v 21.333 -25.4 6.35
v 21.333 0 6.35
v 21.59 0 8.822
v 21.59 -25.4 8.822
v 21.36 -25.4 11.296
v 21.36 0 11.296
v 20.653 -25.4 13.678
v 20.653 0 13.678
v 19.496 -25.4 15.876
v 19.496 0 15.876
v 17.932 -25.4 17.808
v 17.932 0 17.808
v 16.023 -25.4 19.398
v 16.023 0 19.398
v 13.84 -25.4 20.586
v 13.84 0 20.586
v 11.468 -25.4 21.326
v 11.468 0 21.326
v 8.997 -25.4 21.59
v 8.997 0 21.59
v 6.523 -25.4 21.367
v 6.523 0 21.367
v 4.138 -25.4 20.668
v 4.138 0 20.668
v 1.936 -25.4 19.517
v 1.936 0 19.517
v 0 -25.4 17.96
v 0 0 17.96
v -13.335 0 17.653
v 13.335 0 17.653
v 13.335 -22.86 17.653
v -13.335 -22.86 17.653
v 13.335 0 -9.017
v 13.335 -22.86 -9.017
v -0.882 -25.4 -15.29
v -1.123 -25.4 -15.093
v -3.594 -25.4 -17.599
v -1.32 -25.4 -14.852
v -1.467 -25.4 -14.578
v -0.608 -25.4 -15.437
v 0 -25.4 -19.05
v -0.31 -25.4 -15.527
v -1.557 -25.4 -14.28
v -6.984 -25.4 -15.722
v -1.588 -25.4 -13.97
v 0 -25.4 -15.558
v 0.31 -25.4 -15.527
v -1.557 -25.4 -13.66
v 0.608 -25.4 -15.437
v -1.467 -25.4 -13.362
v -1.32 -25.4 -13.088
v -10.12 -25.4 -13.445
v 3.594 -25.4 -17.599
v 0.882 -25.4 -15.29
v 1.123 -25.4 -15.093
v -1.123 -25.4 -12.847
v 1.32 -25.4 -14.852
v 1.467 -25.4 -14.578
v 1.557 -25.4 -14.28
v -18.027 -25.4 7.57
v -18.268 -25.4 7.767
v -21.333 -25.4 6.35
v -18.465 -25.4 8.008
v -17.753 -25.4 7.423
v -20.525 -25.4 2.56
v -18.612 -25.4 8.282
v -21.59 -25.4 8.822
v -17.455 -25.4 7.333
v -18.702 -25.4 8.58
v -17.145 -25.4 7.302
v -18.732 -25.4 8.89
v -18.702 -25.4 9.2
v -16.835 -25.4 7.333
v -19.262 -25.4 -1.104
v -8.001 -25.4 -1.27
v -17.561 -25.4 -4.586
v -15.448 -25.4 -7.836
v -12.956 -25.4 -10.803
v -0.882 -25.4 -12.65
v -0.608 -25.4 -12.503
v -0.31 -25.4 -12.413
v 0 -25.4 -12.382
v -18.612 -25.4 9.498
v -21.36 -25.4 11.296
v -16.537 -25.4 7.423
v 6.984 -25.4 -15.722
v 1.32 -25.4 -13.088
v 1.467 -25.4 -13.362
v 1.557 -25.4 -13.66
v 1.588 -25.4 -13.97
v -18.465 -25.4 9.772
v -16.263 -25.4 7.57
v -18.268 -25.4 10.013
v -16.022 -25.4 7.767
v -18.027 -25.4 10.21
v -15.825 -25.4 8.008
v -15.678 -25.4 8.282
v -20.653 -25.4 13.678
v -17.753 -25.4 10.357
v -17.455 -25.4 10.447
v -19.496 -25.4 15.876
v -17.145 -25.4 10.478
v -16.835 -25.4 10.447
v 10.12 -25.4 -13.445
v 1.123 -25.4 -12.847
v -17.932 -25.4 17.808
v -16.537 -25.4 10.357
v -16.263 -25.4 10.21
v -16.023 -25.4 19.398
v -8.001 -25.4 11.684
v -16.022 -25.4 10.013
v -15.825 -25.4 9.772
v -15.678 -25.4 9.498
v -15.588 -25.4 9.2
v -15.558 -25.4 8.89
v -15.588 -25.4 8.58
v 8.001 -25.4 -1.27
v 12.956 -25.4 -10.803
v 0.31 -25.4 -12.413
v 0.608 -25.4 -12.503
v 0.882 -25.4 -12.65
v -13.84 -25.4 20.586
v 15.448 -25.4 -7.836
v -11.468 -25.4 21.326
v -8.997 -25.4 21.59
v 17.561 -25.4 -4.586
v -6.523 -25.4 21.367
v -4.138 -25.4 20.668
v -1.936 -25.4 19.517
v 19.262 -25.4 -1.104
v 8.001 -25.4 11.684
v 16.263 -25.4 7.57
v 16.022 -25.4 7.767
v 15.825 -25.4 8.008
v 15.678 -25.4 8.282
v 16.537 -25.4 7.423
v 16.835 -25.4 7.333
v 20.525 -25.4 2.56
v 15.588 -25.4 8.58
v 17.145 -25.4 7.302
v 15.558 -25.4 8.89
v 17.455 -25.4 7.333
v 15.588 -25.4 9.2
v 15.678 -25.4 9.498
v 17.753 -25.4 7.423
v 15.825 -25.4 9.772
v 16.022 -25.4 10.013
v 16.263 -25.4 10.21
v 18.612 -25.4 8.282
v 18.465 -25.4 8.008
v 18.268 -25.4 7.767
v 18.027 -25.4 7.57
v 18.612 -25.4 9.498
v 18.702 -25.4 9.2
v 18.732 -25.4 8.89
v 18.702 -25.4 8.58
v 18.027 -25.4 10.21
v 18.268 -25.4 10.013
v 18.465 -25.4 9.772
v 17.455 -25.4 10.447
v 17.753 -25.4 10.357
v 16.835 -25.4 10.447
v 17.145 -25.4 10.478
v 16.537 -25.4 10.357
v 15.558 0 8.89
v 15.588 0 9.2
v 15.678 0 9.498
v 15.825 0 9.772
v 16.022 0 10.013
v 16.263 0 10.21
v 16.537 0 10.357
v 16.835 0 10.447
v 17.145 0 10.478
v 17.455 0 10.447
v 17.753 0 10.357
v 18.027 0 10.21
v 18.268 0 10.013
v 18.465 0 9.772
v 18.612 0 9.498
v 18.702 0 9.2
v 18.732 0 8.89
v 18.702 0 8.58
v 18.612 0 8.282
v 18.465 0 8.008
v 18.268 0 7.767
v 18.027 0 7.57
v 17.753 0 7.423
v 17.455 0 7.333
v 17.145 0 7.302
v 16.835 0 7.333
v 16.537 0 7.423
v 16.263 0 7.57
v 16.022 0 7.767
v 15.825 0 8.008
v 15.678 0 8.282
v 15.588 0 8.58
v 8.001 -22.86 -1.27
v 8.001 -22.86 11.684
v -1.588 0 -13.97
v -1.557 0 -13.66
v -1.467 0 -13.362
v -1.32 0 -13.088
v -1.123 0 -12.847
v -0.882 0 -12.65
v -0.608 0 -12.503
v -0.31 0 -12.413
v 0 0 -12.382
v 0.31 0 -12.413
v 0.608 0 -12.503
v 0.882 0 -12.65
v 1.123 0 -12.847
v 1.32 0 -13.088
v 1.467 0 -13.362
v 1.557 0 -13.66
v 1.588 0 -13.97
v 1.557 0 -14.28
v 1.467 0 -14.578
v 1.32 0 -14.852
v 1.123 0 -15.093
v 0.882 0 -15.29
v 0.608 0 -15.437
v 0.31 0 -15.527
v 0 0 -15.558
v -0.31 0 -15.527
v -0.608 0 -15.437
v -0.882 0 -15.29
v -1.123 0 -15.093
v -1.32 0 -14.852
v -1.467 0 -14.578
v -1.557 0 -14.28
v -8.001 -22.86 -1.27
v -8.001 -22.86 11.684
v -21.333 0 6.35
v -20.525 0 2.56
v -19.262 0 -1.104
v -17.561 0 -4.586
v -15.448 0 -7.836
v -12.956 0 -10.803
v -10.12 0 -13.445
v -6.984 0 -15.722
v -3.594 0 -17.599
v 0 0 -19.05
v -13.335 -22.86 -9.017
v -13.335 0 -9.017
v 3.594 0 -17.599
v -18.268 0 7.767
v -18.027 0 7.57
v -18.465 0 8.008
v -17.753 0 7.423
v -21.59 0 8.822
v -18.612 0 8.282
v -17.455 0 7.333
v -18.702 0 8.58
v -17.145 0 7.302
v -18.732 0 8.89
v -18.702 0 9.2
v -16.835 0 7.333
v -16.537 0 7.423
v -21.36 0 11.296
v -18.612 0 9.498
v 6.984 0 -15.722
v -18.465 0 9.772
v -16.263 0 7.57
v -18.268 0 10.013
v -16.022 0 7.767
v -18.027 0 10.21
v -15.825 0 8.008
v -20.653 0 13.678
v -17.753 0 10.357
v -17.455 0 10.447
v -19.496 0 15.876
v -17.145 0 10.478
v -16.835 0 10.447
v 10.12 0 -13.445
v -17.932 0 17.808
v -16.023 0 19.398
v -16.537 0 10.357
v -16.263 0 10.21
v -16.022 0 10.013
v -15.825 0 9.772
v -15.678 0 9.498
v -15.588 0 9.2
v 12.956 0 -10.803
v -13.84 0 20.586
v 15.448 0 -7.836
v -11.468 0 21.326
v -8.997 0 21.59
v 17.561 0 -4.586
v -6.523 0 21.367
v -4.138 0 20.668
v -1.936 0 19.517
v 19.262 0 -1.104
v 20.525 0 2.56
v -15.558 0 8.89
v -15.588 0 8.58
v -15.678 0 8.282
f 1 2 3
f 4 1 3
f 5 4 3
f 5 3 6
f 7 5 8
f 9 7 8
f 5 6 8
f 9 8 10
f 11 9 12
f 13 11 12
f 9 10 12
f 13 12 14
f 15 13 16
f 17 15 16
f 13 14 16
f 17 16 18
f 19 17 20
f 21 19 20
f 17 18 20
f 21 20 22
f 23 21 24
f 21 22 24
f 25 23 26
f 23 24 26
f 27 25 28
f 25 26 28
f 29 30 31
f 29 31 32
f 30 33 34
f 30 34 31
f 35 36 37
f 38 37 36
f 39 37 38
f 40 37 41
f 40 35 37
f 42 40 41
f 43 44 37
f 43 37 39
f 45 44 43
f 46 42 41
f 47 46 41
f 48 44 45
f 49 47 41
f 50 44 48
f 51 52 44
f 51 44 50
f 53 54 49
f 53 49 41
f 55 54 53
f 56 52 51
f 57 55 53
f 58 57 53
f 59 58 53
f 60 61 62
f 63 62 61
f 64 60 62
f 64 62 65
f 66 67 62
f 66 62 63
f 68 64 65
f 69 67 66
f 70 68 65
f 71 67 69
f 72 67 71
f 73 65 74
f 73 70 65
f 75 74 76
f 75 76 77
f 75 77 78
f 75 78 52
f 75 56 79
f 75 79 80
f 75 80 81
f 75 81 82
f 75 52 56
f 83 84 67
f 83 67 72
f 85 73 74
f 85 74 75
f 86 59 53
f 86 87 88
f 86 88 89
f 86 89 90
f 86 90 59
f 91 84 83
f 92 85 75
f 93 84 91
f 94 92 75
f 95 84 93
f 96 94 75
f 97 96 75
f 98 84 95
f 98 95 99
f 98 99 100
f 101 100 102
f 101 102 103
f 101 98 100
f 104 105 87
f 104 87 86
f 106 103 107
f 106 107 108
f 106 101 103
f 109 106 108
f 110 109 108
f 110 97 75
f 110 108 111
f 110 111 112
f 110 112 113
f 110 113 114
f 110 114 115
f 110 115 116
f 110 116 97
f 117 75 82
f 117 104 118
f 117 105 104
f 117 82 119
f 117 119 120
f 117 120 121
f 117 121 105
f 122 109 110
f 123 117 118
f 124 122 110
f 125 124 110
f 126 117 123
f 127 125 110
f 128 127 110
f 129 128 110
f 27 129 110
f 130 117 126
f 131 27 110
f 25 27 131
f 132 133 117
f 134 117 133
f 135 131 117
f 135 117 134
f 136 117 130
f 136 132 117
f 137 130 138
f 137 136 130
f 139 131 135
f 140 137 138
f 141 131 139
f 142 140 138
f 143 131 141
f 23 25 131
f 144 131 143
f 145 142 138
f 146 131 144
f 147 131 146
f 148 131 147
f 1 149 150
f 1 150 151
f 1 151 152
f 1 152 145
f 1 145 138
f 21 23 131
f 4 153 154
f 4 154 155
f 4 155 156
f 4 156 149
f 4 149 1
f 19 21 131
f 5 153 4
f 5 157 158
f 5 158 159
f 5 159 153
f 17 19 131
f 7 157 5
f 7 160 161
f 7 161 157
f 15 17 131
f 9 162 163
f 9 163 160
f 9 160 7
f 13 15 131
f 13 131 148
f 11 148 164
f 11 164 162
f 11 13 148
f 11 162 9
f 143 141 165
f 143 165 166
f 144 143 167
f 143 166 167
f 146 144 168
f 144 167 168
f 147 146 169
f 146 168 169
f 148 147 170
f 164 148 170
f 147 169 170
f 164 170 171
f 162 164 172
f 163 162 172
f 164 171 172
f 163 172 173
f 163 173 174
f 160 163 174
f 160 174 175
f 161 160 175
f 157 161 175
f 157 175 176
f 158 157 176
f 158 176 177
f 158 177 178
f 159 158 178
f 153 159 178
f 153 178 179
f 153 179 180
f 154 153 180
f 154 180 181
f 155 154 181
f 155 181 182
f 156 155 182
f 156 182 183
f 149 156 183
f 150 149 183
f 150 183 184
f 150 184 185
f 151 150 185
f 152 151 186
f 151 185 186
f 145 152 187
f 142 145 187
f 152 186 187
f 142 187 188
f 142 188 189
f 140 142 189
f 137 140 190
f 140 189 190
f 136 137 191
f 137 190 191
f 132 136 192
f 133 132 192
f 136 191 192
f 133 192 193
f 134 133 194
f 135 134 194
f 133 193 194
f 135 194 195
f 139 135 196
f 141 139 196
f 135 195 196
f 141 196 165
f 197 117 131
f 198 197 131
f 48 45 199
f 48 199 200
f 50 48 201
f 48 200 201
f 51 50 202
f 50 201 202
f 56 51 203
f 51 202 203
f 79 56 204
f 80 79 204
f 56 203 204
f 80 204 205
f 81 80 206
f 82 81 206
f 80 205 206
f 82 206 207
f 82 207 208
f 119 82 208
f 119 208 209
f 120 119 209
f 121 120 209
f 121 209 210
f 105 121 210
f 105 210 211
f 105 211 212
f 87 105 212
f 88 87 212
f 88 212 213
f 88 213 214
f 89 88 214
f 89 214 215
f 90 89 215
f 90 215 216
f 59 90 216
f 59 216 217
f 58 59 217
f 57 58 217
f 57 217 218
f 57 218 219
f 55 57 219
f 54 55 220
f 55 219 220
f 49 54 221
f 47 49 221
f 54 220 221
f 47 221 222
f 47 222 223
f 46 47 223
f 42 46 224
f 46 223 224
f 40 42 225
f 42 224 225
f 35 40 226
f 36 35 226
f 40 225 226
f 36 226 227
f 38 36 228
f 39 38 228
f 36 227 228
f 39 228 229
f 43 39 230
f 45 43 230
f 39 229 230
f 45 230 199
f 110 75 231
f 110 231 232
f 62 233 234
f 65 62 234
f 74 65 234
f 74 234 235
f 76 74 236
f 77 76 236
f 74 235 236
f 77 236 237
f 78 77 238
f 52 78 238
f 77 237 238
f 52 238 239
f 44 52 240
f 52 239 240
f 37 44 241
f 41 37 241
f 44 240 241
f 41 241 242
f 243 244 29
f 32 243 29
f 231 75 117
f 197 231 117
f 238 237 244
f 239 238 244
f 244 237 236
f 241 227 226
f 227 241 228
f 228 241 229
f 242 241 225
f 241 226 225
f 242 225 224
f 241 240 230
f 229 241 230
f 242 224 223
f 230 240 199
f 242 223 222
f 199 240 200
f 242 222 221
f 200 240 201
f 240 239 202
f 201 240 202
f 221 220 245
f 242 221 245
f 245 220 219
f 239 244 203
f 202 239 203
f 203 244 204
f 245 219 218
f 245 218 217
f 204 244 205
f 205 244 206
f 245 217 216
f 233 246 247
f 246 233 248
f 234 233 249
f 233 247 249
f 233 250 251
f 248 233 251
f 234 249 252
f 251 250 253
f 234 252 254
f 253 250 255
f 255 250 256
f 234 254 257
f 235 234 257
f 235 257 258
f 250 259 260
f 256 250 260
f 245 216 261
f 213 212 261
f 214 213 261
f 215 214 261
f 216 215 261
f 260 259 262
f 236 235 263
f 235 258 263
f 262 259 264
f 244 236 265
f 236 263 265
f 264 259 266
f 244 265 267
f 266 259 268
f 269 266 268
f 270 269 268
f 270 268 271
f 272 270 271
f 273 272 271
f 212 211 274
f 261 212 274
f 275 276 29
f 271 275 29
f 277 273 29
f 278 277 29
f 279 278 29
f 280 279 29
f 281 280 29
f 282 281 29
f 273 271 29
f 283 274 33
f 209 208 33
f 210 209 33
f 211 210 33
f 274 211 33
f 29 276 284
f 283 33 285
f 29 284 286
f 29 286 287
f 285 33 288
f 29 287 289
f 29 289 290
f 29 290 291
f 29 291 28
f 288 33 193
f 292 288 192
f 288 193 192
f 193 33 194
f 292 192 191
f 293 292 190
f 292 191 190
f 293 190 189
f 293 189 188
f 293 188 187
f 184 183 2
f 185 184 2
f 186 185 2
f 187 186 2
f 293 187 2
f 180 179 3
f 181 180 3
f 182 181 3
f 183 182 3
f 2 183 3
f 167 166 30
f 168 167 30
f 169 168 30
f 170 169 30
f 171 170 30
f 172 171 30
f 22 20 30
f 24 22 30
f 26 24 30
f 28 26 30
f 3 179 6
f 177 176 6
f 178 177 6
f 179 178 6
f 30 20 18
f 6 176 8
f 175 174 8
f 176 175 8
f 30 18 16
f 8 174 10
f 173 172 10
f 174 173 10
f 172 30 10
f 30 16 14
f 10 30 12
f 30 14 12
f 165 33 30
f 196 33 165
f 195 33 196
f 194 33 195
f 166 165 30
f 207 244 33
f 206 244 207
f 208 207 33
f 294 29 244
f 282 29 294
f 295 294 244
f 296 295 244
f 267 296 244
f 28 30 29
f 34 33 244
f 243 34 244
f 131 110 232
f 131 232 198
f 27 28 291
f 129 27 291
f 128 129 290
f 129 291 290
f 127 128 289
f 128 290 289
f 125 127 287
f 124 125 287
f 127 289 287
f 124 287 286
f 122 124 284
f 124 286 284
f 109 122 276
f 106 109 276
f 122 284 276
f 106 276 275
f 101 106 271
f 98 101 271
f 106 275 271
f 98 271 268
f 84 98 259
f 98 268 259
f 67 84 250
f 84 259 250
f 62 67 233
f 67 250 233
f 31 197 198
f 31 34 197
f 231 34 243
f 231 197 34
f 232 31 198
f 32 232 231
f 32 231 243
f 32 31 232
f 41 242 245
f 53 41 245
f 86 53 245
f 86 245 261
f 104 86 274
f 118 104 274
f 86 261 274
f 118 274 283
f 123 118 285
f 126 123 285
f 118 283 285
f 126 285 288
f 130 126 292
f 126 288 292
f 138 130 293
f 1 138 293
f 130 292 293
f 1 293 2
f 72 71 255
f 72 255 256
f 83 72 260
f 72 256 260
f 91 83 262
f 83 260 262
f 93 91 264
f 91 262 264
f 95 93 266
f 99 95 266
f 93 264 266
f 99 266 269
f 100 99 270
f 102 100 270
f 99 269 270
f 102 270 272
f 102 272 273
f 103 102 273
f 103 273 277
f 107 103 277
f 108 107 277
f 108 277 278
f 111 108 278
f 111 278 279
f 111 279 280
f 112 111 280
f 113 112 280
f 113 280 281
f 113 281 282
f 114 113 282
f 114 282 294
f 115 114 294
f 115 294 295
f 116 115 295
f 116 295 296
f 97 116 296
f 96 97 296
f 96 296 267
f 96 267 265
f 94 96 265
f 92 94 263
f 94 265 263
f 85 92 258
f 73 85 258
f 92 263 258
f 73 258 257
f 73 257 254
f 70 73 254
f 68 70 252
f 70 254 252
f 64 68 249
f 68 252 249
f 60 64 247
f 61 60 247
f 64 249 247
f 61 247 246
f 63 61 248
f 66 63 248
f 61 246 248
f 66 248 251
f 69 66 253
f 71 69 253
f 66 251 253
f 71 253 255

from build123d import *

# Parameters (mm, degrees)
F1_DEPTH = 25.4
F2_W     = 16.002
F2_H     = 12.954
F3_DEPTH = 25.401
F4_W     = 26.67
F4_H     = 26.67
F5_DEPTH = 22.86
F6_R     = 1.5875
F7_DEPTH = 25.401


with BuildPart() as f1:
    # F0 (on Front) → F1 (new body)
    with BuildSketch(Plane.XZ):
        with BuildLine():
            ThreePointArc((0, -19.05), (14.247427, -9.357442), (21.333408, 6.35))
            ThreePointArc((21.333408, 6.35), (14.960623, 20.045157), (0, 17.959614))
            ThreePointArc((0, 17.959614), (-14.960623, 20.045157), (-21.333408, 6.35))
            ThreePointArc((-21.333408, 6.35), (-14.247427, -9.357442), (0, -19.05))
        make_face()
    extrude(amount=F1_DEPTH)

    # F2 (on face) → F3 (cut, through all)
    with BuildSketch(Plane.XZ.offset(25.4)):
        with Locations((0, 5.207)):
            Rectangle(F2_W, F2_H)
    extrude(amount=-F3_DEPTH, mode=Mode.SUBTRACT)

    # F4 (on face) → F5 (cut)
    with BuildSketch(Plane(origin=(0, 0, 0), x_dir=(-1, 0, 0), z_dir=(0, 1, 0))):
        with Locations((0, 4.318)):
            Rectangle(F4_W, F4_H)
    extrude(amount=-F5_DEPTH, mode=Mode.SUBTRACT)

    # F6 (on face) → F7 (cut, through all)
    with BuildSketch(Plane(origin=(0, 0, 0), x_dir=(-1, 0, 0), z_dir=(0, 1, 0))):
        with Locations((-17.145, 8.89)):
            Circle(F6_R)
        with Locations((17.145, 8.89)):
            Circle(F6_R)
        with Locations((0, -13.97)):
            Circle(F6_R)
    extrude(amount=-F7_DEPTH, mode=Mode.SUBTRACT)


solid = f1.part
